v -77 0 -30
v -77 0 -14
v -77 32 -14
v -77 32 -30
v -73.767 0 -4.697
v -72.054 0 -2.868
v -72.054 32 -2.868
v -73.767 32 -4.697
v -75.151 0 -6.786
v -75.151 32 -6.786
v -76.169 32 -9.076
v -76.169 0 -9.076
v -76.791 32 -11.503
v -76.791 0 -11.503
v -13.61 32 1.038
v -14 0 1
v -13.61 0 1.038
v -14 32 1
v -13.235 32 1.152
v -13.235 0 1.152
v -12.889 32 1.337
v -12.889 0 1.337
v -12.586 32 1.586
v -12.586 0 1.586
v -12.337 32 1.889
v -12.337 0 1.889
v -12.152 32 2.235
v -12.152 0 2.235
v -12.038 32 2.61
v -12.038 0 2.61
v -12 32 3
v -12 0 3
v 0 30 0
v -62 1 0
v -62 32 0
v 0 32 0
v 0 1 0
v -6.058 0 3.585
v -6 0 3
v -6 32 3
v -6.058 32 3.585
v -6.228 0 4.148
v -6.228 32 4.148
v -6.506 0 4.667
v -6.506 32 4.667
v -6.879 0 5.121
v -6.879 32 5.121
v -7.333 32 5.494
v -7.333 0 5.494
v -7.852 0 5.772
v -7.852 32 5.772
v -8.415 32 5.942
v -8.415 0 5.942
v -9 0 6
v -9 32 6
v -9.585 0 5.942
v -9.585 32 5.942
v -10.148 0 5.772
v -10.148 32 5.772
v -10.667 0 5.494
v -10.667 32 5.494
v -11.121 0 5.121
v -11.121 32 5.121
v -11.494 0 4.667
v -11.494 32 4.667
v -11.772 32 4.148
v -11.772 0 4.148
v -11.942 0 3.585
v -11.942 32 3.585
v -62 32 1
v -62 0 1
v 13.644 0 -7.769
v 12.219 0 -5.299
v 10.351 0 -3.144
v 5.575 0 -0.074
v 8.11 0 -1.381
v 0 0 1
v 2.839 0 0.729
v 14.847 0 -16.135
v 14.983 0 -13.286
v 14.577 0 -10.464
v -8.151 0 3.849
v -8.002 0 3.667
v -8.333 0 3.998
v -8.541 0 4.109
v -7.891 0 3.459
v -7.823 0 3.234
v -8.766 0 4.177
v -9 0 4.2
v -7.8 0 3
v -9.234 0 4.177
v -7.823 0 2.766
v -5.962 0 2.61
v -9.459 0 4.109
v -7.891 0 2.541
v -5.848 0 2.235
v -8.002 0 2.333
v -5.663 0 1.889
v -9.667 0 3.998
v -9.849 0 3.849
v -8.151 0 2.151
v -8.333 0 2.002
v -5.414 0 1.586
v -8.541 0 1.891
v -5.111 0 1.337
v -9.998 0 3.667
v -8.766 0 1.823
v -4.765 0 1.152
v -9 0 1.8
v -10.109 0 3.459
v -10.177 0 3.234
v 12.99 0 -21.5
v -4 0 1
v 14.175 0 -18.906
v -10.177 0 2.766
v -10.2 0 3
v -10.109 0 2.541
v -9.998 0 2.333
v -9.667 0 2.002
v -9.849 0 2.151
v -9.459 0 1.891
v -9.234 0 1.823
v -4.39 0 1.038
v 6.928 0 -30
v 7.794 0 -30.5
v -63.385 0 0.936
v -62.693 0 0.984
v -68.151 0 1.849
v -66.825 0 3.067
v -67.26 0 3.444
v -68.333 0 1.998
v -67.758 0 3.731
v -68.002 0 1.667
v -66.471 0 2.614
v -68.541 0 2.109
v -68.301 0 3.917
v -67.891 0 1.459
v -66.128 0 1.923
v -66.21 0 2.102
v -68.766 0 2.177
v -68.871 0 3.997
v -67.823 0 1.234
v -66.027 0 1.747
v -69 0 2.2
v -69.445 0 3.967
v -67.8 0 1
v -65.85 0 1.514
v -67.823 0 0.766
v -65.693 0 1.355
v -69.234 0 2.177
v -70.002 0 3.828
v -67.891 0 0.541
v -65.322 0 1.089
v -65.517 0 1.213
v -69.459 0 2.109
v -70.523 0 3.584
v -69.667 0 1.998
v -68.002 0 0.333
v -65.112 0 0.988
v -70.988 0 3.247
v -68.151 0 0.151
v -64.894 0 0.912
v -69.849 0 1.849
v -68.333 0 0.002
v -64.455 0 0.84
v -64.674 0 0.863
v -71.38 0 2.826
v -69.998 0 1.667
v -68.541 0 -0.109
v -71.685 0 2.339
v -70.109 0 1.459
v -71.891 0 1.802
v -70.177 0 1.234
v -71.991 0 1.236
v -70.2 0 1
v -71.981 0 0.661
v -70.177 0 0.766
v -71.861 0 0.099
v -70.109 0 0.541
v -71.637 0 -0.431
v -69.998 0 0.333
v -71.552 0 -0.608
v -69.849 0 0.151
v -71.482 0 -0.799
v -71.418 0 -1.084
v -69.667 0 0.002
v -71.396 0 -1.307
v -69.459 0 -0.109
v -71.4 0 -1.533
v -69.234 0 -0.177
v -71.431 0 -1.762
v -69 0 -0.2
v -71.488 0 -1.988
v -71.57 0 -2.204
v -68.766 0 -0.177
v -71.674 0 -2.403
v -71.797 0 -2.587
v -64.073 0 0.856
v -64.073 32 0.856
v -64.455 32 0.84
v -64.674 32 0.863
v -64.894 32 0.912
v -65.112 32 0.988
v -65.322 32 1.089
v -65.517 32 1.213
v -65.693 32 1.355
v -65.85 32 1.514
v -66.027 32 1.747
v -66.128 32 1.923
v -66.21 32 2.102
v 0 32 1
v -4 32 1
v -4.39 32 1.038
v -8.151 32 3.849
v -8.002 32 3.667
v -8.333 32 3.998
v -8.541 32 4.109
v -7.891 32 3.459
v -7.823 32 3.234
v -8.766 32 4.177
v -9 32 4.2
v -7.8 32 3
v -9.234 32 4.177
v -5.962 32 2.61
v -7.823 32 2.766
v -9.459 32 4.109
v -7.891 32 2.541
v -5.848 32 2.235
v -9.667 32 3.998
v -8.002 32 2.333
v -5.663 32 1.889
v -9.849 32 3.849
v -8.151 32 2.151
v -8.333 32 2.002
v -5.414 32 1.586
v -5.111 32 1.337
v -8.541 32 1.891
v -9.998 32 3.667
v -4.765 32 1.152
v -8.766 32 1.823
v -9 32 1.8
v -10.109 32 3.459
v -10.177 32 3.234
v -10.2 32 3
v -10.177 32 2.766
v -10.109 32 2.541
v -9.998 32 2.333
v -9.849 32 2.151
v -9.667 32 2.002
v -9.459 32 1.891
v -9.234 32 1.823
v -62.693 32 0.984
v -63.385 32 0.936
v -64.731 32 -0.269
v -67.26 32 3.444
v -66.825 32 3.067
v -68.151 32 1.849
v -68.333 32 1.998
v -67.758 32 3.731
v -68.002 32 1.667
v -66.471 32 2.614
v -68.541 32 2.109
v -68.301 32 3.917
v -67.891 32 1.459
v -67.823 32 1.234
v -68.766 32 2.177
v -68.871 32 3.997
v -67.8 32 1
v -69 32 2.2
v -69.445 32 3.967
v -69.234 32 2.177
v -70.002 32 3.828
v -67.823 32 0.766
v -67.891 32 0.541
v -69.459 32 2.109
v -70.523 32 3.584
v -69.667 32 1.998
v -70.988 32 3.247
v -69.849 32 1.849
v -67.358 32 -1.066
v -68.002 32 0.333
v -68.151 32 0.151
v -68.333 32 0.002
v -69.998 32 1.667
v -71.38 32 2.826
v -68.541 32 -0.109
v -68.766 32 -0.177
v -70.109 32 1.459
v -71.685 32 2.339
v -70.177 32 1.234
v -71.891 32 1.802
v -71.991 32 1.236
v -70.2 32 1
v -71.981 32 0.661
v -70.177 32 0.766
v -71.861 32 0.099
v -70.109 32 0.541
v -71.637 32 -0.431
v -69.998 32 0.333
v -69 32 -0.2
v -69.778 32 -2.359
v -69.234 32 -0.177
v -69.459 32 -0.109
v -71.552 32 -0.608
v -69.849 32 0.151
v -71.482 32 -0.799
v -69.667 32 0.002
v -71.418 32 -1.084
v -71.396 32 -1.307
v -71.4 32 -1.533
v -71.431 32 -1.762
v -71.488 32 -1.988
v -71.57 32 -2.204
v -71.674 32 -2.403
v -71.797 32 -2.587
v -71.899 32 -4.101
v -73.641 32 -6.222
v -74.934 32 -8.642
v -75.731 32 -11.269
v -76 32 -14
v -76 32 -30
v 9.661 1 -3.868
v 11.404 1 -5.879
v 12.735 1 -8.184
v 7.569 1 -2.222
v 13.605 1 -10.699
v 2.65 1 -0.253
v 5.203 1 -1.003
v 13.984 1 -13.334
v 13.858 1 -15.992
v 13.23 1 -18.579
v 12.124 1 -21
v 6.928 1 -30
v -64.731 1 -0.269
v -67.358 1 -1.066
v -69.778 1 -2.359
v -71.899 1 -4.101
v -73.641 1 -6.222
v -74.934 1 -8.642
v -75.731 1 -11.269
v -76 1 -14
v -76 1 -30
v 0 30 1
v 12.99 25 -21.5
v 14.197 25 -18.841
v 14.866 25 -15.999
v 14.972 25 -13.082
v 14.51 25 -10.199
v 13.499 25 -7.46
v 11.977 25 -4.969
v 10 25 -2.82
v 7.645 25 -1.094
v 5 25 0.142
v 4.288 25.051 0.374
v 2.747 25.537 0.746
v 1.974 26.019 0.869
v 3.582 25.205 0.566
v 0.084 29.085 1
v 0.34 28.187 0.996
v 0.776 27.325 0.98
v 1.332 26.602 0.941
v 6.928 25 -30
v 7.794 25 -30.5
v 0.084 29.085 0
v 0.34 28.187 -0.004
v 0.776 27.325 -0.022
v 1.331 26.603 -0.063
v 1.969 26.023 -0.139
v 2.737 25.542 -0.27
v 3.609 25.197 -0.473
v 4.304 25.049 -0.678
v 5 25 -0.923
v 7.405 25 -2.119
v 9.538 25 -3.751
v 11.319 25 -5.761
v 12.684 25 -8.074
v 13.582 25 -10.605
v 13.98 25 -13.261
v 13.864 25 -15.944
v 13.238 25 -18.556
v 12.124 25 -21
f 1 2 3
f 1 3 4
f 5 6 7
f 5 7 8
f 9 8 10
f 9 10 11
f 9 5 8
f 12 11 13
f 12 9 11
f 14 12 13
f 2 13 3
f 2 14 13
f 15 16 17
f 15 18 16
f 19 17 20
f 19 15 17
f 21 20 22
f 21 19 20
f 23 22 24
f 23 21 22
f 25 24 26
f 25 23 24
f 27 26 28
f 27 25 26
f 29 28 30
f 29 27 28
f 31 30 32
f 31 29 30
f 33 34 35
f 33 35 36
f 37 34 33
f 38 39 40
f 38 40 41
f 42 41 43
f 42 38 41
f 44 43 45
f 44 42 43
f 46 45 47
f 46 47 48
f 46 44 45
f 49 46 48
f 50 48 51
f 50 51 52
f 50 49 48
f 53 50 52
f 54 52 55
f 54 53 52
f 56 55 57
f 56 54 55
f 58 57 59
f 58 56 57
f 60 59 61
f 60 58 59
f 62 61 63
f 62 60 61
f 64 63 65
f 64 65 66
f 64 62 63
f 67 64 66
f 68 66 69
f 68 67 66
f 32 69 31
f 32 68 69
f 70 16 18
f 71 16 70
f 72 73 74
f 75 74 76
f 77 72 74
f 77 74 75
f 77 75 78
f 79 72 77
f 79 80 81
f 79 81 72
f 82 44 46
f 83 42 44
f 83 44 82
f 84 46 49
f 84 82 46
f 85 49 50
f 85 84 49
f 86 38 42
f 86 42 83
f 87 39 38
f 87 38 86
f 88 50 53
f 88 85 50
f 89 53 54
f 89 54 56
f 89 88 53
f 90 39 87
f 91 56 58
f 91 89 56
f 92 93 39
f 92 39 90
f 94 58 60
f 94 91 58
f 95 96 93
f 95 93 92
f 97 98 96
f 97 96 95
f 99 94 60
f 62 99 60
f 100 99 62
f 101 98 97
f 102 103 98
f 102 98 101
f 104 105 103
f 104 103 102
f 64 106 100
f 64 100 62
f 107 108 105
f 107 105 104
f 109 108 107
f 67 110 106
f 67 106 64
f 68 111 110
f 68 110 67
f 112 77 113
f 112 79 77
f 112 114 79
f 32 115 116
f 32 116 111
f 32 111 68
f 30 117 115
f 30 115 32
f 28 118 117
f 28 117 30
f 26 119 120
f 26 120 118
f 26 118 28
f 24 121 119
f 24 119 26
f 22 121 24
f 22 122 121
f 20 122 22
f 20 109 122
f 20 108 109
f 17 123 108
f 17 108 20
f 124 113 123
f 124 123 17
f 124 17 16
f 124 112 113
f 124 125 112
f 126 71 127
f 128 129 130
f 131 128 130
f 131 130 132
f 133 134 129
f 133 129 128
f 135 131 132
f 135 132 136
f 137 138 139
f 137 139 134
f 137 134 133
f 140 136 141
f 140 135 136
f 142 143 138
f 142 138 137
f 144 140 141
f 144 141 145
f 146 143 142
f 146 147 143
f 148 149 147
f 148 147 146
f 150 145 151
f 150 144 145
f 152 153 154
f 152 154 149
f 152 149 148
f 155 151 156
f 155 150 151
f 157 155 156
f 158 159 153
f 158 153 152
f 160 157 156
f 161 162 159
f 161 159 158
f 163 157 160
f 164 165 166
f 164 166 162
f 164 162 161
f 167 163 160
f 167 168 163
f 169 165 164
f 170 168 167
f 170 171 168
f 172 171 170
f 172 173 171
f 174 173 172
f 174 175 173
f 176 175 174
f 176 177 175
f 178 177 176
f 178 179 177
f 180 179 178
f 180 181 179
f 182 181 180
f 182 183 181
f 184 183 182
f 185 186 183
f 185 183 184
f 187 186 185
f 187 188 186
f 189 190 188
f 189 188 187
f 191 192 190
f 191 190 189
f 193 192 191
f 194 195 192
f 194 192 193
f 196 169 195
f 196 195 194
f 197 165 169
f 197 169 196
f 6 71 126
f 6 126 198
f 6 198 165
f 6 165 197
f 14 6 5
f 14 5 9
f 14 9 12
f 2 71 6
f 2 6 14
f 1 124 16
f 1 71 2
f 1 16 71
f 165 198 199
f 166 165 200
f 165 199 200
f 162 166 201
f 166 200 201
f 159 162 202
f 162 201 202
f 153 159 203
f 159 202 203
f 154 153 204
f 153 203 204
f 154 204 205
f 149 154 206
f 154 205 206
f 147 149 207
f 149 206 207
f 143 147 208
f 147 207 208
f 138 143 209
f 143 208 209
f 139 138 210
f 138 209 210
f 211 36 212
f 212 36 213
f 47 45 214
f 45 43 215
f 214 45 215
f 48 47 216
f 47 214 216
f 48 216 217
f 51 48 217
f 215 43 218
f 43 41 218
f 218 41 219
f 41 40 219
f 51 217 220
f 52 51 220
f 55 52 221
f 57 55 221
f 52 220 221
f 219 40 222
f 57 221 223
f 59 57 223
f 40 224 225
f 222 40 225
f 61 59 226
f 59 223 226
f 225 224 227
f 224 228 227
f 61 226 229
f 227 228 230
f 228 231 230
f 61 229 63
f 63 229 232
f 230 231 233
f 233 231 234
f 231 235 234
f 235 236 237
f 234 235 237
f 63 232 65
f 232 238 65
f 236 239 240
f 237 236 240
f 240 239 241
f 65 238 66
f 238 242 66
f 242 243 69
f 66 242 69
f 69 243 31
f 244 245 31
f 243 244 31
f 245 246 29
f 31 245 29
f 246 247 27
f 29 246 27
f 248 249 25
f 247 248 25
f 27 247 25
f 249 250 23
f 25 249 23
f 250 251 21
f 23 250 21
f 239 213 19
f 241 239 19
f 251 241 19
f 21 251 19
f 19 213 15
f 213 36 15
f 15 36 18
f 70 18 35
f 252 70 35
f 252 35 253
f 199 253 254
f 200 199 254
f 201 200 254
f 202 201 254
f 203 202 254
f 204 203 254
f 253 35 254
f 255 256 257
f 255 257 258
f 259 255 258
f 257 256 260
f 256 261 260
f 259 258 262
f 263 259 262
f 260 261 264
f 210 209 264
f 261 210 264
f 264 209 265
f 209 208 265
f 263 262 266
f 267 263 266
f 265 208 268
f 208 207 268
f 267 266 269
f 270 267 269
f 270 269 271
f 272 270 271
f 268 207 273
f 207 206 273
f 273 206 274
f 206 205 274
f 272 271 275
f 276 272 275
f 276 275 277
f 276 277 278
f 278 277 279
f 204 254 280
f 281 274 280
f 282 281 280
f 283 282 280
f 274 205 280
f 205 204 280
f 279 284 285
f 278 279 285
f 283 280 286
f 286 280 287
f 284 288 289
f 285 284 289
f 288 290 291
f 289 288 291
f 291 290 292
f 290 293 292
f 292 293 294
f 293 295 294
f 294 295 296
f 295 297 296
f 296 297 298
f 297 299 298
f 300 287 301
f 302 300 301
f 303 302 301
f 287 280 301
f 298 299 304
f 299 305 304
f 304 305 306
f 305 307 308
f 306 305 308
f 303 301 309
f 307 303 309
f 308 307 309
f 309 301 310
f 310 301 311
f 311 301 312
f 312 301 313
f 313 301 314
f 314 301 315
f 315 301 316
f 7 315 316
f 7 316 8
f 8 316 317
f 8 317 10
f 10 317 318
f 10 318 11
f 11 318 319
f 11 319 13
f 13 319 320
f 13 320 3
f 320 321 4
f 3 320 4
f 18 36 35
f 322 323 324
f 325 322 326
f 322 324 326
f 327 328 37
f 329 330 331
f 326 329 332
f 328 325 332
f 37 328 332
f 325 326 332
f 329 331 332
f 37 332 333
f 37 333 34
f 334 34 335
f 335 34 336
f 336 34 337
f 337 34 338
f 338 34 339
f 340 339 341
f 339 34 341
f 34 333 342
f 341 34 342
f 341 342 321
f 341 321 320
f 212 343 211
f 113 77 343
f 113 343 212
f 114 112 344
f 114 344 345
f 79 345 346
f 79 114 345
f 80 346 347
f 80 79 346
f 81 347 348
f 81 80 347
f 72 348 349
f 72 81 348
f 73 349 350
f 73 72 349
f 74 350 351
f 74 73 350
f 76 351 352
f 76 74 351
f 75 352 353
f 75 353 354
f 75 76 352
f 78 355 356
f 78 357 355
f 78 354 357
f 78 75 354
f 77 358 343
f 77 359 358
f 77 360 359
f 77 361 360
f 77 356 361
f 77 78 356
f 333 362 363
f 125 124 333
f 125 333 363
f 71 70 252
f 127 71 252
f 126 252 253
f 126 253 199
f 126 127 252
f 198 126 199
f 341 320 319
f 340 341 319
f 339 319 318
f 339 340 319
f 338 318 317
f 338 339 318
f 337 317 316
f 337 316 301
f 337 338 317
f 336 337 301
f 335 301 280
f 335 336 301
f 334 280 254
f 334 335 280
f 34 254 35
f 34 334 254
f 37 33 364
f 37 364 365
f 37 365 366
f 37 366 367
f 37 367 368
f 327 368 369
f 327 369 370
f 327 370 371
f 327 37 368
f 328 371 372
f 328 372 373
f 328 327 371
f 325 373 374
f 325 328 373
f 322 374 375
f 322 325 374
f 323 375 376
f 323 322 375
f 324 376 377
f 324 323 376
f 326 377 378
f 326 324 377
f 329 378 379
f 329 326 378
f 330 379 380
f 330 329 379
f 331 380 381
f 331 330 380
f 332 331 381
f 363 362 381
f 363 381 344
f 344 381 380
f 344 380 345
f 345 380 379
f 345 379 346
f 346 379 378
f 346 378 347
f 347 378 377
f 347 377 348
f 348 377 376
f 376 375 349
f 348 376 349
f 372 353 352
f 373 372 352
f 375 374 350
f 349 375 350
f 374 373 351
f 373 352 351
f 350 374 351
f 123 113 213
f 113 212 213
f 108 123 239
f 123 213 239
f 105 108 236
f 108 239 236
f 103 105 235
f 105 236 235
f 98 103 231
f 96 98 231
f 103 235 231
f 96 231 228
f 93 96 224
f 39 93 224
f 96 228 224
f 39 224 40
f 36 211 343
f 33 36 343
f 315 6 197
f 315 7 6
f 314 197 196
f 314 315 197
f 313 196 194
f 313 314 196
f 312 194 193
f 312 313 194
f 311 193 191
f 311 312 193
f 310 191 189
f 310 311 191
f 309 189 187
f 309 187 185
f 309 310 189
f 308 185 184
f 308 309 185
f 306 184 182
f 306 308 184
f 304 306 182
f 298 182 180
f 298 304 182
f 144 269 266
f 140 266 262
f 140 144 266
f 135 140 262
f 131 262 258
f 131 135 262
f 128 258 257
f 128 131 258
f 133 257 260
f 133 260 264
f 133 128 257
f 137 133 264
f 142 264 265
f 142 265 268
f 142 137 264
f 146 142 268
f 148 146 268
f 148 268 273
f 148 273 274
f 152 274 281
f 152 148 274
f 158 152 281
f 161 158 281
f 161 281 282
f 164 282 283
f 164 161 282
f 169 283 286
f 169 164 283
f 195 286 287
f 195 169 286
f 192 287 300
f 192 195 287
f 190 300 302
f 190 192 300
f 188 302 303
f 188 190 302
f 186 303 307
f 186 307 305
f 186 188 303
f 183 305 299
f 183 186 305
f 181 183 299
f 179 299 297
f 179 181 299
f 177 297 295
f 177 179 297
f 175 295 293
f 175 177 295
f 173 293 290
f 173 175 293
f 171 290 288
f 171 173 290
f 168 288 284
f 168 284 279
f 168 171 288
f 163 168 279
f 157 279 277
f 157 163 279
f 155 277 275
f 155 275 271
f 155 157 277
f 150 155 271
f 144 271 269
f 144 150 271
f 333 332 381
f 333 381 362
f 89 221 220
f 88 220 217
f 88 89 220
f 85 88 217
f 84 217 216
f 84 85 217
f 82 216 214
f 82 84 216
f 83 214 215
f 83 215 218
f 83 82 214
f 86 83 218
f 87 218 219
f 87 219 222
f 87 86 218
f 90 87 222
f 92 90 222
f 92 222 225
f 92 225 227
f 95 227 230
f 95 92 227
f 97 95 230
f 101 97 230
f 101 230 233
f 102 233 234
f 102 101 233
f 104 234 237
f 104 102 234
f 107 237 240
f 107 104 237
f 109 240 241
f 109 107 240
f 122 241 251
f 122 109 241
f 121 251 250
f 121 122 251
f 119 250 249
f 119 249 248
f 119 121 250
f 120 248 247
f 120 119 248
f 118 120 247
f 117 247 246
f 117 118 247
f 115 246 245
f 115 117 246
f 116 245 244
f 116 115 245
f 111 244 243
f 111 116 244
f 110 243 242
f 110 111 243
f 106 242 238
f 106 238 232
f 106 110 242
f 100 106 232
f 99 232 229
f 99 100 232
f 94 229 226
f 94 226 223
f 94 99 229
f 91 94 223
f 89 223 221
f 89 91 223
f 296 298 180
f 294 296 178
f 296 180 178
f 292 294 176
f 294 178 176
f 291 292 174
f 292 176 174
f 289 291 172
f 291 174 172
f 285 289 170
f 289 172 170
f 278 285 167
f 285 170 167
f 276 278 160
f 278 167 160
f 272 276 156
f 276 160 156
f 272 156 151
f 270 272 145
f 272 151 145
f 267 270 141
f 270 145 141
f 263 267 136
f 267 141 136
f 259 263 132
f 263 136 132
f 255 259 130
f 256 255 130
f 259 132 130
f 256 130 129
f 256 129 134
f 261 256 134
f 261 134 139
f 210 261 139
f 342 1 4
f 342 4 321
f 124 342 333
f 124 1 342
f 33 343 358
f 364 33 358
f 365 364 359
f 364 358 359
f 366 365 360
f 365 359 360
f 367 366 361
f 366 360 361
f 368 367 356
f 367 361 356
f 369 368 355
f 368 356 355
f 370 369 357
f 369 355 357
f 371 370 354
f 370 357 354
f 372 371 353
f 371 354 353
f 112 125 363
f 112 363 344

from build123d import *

# Parameters (mm, degrees)
EXTRU_MINCE1_DEPTH      = 32
BOSS_EXTRU_1_DEPTH      = 1
ESQUISSE3_R             = 1.2
BOSS_EXTRU_2_DEPTH      = 32
CONG_1_R                = 2
ENL_V_MAT_EXTRU_1_DEPTH = 83.37492882


with BuildPart() as part:
    # Esquisse1 → Extru.-Mince1 (new body)
    with BuildSketch(Plane(origin=(0, 0, 0), x_dir=(1, 0, 0), z_dir=(0, 1, 0))):
        with BuildLine():
            Line((-76, 30), (-76, 14))
            ThreePointArc((-76, 14), (-71.899494937, 4.100505063), (-62, 0))
            Line((-62, 0), (0, 0))
            ThreePointArc((0, 0), (12.124355653, 7), (12.124355653, 21))
            Line((12.124355653, 21), (6.92820323, 30))
            Line((6.92820323, 30), (7.794228634, 30.5))
            Line((7.794228634, 30.5), (12.990381057, 21.5))
            ThreePointArc((12.990381057, 21.5), (12.990381057, 6.5), (0, -1))
            Line((0, -1), (-62, -1))
            ThreePointArc((-62, -1), (-72.606601718, 3.393398282), (-77, 14))
            Line((-77, 14), (-77, 30))
            Line((-77, 30), (-76, 30))
        make_face()
    extrude(amount=EXTRU_MINCE1_DEPTH)

    # Esquisse2 → Boss.-Extru.1 (add)
    with BuildSketch(Plane(origin=(0, 0, 0), x_dir=(1, 0, 0), z_dir=(0, 1, 0))):
        with BuildLine():
            Line((-76, 30), (6.92820323, 30))
            Line((6.92820323, 30), (12.124355653, 21))
            ThreePointArc((12.124355653, 21), (12.124355653, 7), (0, 0))
            Line((0, 0), (-62, 0))
            ThreePointArc((-62, 0), (-71.899494937, 4.100505063), (-76, 14))
            Line((-76, 14), (-76, 30))
        make_face()
    extrude(amount=BOSS_EXTRU_1_DEPTH)

    # Esquisse3 → Boss.-Extru.2 (add)
    # profile 1 of 2: a face of its own
    with BuildSketch(Plane(origin=(0, 0, 0), x_dir=(1, 0, 0), z_dir=(0, 1, 0))):
        with BuildLine():
            Line((-11.236067977, -1), (-6.763932023, -1))
            ThreePointArc((-6.763932023, -1), (-9, -6), (-11.236067977, -1))
        make_face()
        with Locations(Location((-9, -3, 0), (0, 0, 270))):
            Circle(ESQUISSE3_R, mode=Mode.SUBTRACT)
    # profile 2 of 2: a face of its own
    with BuildSketch(Plane(origin=(0, 0, 0), x_dir=(1, 0, 0), z_dir=(0, 1, 0))):
        with BuildLine():
            ThreePointArc((-70.465946464, 1.617441683), (-70.268656396, -3.71854942), (-66.052301711, -0.442259201))
            ThreePointArc((-66.052301711, -0.442259201), (-68.34328198, 0.4072529), (-70.465946464, 1.617441683))
        make_face()
        with Locations(Location((-69, -1, 0), (0, 0, 270))):
            Circle(ESQUISSE3_R, mode=Mode.SUBTRACT)
    extrude(amount=BOSS_EXTRU_2_DEPTH)

    # Congé1
    cong_1_edges = [part.edges().sort_by_distance(p)[0] for p in [
        (-6.763932023, 16, 1),
        (-11.236067977, 16, 1),
        (-70.465946464, 16, -1.617441683),
        (-66.052301711, 16, 0.442259201),
    ]]
    fillet(cong_1_edges, radius=CONG_1_R)

    # Esquisse4 → Enlèv. mat.-Extru.1 (cut, through all)
    with BuildSketch(Plane(origin=(-7.939310229, 0, 1), x_dir=(-1, 0, 0), z_dir=(0, 0, -1))):
        with BuildLine():
            Line((-22.939310229, 32), (-7.939310229, 32))
            Line((-7.939310229, 32), (-7.939310229, 30))
            ThreePointArc((-7.939310229, 30), (-9.403776323, 26.464466094), (-12.939310229, 25))
            Line((-12.939310229, 25), (-22.939310229, 25))
            Line((-22.939310229, 25), (-22.939310229, 32))
        make_face()
    extrude(amount=ENL_V_MAT_EXTRU_1_DEPTH, mode=Mode.SUBTRACT)


solid = part.part
